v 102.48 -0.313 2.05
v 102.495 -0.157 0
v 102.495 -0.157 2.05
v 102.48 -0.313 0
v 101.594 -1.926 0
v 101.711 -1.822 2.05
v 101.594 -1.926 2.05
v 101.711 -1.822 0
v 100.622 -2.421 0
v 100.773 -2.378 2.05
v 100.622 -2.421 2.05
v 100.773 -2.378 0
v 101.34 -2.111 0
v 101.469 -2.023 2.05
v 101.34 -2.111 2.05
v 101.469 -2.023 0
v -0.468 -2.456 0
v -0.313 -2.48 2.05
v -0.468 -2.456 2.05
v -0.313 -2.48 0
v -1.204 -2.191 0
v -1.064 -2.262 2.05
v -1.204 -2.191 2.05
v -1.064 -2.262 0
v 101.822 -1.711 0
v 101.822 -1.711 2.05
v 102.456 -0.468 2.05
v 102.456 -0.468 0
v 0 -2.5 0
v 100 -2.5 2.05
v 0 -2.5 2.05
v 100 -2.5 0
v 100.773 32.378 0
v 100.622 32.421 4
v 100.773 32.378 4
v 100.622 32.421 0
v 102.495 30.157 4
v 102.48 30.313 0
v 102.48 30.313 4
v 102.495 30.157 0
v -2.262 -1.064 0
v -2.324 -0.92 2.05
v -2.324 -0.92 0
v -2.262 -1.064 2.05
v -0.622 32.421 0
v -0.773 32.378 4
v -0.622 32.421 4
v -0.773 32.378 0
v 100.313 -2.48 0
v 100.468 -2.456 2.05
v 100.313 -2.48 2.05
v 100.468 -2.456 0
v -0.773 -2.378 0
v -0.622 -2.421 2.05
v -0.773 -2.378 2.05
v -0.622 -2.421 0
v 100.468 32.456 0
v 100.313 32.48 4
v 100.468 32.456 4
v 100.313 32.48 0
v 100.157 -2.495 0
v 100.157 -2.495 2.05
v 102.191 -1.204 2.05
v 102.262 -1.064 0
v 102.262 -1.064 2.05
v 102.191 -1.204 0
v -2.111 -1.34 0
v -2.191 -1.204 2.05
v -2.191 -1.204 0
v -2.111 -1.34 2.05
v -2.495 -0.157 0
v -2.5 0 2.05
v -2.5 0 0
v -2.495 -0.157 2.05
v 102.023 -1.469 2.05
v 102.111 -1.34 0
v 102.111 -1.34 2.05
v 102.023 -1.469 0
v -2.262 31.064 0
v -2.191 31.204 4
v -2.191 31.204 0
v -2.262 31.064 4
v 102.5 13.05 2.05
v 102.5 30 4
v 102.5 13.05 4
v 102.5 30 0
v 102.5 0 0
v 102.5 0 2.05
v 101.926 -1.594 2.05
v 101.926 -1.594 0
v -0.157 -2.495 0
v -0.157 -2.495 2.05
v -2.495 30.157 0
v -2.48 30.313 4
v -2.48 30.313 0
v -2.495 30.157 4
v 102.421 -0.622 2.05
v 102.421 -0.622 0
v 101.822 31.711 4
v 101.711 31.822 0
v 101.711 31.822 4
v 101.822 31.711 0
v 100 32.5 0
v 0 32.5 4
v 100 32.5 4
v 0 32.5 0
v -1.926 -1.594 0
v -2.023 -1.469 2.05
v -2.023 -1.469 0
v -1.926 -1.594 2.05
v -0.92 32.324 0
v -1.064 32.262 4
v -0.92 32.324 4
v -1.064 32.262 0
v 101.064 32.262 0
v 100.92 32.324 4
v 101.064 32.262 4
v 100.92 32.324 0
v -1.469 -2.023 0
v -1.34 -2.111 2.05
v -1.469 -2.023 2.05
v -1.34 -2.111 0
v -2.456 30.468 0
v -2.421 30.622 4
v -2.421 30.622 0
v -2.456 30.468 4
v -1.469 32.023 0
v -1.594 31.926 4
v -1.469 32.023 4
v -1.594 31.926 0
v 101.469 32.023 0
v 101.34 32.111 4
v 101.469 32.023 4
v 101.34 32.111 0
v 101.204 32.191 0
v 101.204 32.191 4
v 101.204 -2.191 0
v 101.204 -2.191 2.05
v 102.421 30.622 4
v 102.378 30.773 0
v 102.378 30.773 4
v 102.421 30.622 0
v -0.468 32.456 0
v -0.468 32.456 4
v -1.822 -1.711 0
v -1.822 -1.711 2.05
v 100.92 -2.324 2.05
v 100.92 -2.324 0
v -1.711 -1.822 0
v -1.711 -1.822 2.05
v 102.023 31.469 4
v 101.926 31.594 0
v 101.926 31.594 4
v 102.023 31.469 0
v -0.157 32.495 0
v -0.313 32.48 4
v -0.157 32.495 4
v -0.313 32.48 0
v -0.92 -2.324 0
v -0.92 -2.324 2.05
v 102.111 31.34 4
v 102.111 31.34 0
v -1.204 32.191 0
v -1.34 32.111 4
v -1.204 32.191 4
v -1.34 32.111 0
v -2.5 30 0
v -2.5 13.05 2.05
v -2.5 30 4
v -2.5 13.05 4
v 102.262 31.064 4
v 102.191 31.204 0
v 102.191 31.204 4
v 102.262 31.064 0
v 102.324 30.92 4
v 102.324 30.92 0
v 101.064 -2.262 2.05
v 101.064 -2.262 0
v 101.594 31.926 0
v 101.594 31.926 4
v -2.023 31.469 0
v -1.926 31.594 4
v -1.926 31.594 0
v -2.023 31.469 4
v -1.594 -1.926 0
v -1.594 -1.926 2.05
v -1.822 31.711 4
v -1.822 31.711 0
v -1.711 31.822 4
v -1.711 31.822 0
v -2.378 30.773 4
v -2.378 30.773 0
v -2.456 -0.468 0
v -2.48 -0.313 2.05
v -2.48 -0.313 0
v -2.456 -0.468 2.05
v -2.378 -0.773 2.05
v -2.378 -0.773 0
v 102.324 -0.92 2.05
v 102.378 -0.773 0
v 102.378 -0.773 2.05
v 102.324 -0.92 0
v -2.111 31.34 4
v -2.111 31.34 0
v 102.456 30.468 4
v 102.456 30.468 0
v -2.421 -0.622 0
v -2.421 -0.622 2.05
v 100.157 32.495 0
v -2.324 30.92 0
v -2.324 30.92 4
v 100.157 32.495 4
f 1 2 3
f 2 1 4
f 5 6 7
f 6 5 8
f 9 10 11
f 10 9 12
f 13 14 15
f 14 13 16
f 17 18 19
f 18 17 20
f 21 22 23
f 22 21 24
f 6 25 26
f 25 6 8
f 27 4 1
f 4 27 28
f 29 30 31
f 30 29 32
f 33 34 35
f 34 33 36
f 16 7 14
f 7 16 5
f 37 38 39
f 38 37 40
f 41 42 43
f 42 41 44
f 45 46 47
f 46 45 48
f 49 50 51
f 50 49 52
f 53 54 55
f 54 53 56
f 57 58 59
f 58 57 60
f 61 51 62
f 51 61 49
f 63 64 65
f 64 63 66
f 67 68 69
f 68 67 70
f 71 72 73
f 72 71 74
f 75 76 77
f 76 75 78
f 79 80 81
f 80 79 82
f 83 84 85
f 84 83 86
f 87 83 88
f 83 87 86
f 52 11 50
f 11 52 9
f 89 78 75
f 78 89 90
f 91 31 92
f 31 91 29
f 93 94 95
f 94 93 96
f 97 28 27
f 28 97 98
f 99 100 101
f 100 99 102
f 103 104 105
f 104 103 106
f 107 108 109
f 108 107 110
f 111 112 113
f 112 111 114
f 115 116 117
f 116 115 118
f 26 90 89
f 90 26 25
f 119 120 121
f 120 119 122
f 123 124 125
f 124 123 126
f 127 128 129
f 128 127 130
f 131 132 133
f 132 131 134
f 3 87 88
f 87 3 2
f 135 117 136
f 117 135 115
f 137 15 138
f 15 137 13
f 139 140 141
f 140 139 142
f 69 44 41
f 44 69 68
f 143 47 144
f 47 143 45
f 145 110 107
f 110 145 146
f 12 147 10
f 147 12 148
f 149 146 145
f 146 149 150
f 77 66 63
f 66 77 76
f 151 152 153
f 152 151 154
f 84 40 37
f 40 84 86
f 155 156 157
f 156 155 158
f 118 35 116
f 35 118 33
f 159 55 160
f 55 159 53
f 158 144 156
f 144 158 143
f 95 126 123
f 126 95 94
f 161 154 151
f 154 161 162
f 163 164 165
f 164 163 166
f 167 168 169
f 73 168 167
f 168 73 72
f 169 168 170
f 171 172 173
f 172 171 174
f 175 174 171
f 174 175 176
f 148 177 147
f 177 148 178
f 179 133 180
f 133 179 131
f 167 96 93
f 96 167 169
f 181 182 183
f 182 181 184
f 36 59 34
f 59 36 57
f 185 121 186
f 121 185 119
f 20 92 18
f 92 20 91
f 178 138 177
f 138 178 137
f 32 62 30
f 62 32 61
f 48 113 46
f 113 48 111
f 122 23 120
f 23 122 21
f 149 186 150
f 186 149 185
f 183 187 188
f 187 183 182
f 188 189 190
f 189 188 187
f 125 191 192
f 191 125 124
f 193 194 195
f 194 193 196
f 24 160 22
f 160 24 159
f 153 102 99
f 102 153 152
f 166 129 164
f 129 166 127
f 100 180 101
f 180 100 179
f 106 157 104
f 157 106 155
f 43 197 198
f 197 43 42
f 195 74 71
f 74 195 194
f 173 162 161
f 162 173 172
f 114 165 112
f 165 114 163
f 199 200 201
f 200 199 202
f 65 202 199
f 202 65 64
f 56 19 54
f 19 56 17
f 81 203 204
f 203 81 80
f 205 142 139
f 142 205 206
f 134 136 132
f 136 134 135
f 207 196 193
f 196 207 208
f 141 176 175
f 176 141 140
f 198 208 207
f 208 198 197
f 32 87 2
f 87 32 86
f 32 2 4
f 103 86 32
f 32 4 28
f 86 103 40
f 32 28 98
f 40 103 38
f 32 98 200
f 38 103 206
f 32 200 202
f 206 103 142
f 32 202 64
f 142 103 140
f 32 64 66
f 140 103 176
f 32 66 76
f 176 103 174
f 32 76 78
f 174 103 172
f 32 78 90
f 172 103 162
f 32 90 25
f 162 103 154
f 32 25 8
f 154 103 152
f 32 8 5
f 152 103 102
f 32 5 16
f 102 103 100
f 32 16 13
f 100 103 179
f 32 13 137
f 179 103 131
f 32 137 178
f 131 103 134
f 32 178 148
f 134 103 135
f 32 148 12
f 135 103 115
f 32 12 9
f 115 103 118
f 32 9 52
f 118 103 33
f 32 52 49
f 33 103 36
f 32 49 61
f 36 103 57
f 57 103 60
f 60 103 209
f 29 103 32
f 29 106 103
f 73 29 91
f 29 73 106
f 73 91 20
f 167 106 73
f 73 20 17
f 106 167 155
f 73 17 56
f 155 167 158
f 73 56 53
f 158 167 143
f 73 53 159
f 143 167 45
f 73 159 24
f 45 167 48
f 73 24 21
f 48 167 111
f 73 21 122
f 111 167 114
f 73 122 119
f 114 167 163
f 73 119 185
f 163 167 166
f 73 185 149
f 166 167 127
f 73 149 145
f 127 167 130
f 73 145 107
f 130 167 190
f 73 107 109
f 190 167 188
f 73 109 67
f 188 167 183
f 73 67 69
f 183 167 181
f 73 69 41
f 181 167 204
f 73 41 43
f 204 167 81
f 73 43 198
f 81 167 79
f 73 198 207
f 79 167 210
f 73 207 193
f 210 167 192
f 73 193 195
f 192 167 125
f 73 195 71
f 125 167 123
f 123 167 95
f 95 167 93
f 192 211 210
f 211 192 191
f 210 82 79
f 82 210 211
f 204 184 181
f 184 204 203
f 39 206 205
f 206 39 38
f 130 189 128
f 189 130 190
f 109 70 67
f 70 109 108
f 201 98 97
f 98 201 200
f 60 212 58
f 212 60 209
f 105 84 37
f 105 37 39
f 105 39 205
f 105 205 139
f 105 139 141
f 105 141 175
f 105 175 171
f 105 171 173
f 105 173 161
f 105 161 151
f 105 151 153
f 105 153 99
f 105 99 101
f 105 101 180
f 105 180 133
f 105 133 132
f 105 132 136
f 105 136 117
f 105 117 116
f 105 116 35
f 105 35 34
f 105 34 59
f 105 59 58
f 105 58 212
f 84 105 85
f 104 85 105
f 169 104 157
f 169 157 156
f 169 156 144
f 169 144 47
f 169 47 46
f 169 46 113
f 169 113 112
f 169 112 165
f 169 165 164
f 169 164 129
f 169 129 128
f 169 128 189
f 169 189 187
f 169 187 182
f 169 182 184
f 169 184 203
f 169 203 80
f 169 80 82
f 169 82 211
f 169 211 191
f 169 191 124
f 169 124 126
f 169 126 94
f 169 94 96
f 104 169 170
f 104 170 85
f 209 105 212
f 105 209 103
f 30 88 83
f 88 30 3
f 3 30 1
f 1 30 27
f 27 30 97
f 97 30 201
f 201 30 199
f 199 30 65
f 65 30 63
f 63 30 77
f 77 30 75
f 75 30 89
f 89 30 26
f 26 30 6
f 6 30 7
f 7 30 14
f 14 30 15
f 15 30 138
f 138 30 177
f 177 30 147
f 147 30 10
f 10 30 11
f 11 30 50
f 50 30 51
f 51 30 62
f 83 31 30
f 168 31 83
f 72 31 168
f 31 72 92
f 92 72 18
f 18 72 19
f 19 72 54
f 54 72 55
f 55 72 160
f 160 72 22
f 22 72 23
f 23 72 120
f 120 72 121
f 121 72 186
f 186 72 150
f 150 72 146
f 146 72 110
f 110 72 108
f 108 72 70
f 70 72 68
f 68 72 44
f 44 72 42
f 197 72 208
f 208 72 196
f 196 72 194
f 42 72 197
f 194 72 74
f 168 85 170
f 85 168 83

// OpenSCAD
$fn=100;

module mantinel(d=5,base_h=4,cut_h=2,l=100,cut_a=18,base_a=30)
{
    difference()
    {
        hull()
        {
            cylinder(d=d,h=base_h);
            translate([l,0,0]) cylinder(d=d,h=base_h);
            translate([l,base_a,0]) cylinder(d=d,h=base_h);
            translate([0,base_a,0]) cylinder(d=d,h=base_h);           
        }
        translate([-d-0.05,-d-0.05,base_h-cut_h+0.05])
            cube([2*d+l+0.1,cut_a+0.1,cut_h]);
    }
}

mantinel();
